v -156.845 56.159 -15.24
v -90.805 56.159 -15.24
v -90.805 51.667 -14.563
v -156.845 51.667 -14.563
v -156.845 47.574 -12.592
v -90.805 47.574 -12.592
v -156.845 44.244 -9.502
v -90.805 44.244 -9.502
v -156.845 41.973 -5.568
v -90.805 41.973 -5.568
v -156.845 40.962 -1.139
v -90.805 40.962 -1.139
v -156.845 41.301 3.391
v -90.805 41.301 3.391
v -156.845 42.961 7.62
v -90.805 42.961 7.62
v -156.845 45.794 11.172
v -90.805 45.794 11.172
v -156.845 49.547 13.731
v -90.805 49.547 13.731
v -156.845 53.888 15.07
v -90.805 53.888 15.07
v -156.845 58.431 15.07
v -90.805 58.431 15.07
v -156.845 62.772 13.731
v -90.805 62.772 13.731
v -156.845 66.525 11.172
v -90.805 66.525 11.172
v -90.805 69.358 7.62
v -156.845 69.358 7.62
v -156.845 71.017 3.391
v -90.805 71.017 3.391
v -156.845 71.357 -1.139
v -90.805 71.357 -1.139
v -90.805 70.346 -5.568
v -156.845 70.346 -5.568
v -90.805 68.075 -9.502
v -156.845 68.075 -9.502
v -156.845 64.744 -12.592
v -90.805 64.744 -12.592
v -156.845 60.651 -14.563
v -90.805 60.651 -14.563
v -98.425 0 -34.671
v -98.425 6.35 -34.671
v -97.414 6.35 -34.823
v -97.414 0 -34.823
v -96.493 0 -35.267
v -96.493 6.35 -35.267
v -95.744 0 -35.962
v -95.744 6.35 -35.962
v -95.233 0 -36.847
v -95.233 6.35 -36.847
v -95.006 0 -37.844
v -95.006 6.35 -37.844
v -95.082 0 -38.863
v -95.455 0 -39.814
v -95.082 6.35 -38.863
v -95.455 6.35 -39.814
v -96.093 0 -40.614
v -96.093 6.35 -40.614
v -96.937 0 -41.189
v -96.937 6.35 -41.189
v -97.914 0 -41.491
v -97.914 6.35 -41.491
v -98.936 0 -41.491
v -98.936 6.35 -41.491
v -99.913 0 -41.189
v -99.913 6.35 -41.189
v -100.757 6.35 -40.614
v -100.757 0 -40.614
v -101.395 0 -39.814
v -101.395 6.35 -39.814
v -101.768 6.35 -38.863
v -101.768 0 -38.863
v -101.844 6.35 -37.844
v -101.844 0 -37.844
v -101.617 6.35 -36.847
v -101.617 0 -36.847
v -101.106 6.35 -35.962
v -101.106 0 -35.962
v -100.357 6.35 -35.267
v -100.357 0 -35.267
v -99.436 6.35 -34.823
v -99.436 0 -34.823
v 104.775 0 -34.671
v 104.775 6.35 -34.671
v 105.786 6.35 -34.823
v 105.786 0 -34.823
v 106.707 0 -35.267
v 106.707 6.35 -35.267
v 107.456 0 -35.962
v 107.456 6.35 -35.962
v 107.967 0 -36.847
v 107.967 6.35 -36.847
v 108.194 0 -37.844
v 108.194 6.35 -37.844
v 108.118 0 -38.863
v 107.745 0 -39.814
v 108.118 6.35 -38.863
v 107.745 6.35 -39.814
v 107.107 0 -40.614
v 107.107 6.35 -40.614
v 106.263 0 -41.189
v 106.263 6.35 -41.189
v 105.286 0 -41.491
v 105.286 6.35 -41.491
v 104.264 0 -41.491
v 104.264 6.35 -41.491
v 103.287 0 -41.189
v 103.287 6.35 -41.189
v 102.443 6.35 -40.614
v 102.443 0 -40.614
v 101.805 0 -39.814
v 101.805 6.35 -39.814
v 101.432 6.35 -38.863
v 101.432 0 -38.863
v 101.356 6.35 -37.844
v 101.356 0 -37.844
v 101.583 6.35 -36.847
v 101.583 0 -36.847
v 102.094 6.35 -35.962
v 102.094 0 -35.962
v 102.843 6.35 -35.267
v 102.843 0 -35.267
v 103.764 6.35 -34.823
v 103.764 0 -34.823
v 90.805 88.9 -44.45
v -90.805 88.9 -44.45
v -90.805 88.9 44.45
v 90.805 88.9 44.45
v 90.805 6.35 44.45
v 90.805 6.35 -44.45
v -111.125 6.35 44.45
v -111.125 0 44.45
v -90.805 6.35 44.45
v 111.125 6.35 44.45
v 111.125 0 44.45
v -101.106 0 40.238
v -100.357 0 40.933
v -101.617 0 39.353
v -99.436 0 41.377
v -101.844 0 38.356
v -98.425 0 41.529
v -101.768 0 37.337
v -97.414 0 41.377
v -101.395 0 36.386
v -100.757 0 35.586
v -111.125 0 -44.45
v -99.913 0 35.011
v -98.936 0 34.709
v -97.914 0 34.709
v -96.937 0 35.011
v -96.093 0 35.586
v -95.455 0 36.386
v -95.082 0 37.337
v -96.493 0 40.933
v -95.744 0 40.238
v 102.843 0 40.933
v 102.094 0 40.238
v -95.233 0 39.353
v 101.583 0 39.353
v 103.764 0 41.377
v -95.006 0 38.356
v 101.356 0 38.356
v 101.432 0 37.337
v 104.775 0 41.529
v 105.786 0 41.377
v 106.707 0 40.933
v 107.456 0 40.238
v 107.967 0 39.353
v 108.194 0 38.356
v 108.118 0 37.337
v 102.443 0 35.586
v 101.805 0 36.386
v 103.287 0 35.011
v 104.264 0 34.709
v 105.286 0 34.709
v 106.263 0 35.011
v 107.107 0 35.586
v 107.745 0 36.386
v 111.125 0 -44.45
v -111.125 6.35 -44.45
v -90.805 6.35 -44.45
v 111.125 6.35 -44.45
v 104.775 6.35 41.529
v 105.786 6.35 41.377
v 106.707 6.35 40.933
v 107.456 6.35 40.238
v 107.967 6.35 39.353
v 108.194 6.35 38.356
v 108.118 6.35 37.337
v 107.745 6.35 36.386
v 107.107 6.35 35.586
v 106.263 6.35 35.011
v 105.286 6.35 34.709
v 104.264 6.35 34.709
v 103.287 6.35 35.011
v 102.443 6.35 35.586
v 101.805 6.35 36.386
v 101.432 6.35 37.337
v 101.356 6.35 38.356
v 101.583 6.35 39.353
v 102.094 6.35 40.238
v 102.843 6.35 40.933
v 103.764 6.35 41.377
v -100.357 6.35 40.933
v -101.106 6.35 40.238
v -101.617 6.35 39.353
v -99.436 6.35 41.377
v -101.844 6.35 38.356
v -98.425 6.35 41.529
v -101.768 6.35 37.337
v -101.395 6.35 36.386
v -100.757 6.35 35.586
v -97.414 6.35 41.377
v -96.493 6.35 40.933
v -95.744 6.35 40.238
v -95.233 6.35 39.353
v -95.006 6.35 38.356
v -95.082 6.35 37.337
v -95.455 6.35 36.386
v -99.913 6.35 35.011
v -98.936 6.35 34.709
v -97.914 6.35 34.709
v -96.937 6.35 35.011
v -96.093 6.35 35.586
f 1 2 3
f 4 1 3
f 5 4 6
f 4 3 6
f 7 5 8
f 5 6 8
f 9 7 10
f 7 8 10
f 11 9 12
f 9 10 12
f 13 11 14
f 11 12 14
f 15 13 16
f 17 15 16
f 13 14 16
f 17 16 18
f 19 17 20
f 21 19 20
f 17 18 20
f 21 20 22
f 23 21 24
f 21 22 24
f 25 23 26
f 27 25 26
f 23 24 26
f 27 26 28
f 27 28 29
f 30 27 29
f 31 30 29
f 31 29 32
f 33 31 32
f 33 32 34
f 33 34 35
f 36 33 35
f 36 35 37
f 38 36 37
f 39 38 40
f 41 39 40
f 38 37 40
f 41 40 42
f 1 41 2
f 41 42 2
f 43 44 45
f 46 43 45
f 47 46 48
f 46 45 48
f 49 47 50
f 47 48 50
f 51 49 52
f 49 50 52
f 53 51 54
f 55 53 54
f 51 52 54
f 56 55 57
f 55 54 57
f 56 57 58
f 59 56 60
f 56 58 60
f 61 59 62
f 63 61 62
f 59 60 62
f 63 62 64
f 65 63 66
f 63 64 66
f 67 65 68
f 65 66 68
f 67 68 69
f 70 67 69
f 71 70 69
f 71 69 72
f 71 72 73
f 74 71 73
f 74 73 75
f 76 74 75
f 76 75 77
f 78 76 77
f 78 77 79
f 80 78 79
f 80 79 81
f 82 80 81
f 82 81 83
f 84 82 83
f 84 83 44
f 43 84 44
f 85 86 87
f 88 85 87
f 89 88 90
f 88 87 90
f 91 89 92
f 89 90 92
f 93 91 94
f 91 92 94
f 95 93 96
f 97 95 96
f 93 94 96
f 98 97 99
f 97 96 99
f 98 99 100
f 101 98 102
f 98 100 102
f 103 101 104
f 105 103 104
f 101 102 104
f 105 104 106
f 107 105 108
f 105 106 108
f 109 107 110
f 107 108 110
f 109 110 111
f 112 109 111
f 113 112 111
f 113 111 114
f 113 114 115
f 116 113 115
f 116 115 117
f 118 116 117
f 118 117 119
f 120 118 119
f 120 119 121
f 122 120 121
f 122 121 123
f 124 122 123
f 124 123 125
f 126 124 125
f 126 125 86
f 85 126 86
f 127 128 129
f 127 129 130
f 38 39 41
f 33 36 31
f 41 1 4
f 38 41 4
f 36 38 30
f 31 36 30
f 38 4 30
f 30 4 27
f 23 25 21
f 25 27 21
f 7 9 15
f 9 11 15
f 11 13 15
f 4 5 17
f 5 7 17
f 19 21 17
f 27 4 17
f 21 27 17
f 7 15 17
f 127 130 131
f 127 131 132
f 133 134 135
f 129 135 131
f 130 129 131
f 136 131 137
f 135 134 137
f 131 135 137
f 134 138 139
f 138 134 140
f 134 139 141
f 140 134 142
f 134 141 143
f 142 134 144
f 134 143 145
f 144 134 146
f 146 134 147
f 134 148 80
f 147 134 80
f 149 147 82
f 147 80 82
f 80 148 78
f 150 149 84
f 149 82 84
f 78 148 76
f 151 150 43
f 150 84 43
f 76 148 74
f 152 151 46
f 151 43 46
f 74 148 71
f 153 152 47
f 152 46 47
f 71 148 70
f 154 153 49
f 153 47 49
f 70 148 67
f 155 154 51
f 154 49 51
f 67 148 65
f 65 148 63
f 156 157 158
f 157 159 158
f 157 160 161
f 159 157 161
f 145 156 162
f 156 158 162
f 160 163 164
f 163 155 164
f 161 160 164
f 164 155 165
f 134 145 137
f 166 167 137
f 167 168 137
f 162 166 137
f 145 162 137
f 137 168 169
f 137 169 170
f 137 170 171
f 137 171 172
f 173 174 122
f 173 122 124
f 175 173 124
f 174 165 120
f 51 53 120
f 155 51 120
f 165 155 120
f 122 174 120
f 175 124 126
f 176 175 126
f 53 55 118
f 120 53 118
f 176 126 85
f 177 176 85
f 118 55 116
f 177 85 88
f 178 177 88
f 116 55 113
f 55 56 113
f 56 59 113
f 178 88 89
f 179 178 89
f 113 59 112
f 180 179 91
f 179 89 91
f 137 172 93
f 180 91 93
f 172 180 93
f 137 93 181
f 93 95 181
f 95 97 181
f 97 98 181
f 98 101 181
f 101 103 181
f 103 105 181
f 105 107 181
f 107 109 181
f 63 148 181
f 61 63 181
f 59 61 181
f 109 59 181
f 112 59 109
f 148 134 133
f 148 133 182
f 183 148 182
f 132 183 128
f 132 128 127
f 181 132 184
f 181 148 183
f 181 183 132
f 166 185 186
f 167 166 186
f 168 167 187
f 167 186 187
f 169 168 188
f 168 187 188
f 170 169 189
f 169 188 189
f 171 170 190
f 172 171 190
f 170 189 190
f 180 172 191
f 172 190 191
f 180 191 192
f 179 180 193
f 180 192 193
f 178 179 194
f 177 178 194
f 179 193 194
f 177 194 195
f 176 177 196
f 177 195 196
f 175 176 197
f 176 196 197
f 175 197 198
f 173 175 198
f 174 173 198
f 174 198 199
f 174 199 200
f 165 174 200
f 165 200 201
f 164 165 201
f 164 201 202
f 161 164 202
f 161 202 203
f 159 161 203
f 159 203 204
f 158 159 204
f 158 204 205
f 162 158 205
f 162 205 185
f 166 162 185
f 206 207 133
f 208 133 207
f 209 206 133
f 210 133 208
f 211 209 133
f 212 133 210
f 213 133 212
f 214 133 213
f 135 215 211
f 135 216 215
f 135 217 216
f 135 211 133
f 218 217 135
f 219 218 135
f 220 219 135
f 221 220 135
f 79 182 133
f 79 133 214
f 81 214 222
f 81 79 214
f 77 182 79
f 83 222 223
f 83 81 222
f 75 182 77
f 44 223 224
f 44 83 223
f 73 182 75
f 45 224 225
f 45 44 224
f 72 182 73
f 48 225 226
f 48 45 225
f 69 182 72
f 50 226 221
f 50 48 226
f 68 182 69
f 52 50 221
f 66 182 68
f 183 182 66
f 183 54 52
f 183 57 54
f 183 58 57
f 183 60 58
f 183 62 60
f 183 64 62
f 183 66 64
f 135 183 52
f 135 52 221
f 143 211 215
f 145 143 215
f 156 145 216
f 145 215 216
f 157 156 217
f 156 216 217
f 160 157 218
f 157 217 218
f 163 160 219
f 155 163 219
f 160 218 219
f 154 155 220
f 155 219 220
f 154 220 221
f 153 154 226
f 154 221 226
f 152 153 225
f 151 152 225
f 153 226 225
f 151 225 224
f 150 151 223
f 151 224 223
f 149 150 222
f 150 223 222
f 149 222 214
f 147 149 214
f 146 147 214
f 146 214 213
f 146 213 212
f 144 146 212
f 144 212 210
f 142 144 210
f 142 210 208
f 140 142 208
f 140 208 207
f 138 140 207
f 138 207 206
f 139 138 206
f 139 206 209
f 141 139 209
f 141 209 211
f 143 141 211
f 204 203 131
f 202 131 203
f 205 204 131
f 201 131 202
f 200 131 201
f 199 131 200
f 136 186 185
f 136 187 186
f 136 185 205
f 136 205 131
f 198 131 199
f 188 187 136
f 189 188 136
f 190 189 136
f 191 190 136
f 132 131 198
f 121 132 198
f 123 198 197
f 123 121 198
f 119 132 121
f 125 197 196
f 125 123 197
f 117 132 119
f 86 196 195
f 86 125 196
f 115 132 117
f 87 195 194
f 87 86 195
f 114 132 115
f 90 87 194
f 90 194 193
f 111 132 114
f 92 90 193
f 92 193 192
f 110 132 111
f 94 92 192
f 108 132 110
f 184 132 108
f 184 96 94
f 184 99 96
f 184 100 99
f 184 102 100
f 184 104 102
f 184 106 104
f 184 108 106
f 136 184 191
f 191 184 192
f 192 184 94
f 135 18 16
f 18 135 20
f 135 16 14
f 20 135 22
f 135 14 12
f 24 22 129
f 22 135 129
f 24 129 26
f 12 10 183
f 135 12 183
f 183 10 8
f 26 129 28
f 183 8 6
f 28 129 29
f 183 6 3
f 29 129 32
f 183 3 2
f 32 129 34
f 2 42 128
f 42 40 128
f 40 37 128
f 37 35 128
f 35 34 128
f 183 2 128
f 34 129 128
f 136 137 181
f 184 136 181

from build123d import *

# Parameters (mm, degrees)
SKETCH1_W           = 222.25
SKETCH1_H           = 88.9
BOSS_EXTRUDE1_DEPTH = 88.9
SKETCH4_W           = 20.32
SKETCH4_H           = 88.9
CUT_EXTRUDE1_DEPTH  = 82.55
SKETCH2_W           = 156.845
SKETCH2_H           = 15.24
SKETCH5_R           = 3.429
CUT_EXTRUDE2_DEPTH  = 183.731111267


with BuildPart() as part:
    # Sketch1 → Boss-Extrude1 (new body)
    with BuildSketch(Plane(origin=(0, 0, 0), x_dir=(1, 0, 0), z_dir=(0, 1, 0))):
        Rectangle(SKETCH1_W, SKETCH1_H)
    extrude(amount=BOSS_EXTRUDE1_DEPTH)

    # Sketch4 → Cut-Extrude1 (cut)
    with BuildSketch(Plane(origin=(0, 88.9, 0), x_dir=(1, 0, 0), z_dir=(0, 1, 0))):
        with Locations((-100.965, 0)):
            Rectangle(SKETCH4_W, SKETCH4_H)
        with Locations((100.965, 0)):
            Rectangle(SKETCH4_W, SKETCH4_H)
    extrude(amount=-CUT_EXTRUDE1_DEPTH, mode=Mode.SUBTRACT)

    # Sketch2 → Revolve1 (revolve)
    with BuildSketch(Plane(origin=(0, 56.1594, 0), x_dir=(1, 0, 0), z_dir=(0, 1, 0))):
        with Locations((-78.4225, 7.62)):
            Rectangle(SKETCH2_W, SKETCH2_H)
    revolve(axis=Axis((0, 56.1594, 0), (-1, 0, 0)))

    # Sketch5 → Cut-Extrude2 (cut, through all)
    with BuildSketch(Plane(origin=(0, 6.35, 0), x_dir=(1, 0, 0), z_dir=(0, 1, 0))):
        with Locations(Location((-98.425, 38.1, 0), (0, 0, 270))):
            Circle(SKETCH5_R)
        with Locations(Location((104.775, 38.1, 0), (0, 0, 270))):
            Circle(SKETCH5_R)
        with Locations(Location((104.775, -38.1, 0), (0, 0, 270))):
            Circle(SKETCH5_R)
        with Locations(Location((-98.425, -38.1, 0), (0, 0, 270))):
            Circle(SKETCH5_R)
    extrude(amount=-CUT_EXTRUDE2_DEPTH, mode=Mode.SUBTRACT)


solid = part.part
